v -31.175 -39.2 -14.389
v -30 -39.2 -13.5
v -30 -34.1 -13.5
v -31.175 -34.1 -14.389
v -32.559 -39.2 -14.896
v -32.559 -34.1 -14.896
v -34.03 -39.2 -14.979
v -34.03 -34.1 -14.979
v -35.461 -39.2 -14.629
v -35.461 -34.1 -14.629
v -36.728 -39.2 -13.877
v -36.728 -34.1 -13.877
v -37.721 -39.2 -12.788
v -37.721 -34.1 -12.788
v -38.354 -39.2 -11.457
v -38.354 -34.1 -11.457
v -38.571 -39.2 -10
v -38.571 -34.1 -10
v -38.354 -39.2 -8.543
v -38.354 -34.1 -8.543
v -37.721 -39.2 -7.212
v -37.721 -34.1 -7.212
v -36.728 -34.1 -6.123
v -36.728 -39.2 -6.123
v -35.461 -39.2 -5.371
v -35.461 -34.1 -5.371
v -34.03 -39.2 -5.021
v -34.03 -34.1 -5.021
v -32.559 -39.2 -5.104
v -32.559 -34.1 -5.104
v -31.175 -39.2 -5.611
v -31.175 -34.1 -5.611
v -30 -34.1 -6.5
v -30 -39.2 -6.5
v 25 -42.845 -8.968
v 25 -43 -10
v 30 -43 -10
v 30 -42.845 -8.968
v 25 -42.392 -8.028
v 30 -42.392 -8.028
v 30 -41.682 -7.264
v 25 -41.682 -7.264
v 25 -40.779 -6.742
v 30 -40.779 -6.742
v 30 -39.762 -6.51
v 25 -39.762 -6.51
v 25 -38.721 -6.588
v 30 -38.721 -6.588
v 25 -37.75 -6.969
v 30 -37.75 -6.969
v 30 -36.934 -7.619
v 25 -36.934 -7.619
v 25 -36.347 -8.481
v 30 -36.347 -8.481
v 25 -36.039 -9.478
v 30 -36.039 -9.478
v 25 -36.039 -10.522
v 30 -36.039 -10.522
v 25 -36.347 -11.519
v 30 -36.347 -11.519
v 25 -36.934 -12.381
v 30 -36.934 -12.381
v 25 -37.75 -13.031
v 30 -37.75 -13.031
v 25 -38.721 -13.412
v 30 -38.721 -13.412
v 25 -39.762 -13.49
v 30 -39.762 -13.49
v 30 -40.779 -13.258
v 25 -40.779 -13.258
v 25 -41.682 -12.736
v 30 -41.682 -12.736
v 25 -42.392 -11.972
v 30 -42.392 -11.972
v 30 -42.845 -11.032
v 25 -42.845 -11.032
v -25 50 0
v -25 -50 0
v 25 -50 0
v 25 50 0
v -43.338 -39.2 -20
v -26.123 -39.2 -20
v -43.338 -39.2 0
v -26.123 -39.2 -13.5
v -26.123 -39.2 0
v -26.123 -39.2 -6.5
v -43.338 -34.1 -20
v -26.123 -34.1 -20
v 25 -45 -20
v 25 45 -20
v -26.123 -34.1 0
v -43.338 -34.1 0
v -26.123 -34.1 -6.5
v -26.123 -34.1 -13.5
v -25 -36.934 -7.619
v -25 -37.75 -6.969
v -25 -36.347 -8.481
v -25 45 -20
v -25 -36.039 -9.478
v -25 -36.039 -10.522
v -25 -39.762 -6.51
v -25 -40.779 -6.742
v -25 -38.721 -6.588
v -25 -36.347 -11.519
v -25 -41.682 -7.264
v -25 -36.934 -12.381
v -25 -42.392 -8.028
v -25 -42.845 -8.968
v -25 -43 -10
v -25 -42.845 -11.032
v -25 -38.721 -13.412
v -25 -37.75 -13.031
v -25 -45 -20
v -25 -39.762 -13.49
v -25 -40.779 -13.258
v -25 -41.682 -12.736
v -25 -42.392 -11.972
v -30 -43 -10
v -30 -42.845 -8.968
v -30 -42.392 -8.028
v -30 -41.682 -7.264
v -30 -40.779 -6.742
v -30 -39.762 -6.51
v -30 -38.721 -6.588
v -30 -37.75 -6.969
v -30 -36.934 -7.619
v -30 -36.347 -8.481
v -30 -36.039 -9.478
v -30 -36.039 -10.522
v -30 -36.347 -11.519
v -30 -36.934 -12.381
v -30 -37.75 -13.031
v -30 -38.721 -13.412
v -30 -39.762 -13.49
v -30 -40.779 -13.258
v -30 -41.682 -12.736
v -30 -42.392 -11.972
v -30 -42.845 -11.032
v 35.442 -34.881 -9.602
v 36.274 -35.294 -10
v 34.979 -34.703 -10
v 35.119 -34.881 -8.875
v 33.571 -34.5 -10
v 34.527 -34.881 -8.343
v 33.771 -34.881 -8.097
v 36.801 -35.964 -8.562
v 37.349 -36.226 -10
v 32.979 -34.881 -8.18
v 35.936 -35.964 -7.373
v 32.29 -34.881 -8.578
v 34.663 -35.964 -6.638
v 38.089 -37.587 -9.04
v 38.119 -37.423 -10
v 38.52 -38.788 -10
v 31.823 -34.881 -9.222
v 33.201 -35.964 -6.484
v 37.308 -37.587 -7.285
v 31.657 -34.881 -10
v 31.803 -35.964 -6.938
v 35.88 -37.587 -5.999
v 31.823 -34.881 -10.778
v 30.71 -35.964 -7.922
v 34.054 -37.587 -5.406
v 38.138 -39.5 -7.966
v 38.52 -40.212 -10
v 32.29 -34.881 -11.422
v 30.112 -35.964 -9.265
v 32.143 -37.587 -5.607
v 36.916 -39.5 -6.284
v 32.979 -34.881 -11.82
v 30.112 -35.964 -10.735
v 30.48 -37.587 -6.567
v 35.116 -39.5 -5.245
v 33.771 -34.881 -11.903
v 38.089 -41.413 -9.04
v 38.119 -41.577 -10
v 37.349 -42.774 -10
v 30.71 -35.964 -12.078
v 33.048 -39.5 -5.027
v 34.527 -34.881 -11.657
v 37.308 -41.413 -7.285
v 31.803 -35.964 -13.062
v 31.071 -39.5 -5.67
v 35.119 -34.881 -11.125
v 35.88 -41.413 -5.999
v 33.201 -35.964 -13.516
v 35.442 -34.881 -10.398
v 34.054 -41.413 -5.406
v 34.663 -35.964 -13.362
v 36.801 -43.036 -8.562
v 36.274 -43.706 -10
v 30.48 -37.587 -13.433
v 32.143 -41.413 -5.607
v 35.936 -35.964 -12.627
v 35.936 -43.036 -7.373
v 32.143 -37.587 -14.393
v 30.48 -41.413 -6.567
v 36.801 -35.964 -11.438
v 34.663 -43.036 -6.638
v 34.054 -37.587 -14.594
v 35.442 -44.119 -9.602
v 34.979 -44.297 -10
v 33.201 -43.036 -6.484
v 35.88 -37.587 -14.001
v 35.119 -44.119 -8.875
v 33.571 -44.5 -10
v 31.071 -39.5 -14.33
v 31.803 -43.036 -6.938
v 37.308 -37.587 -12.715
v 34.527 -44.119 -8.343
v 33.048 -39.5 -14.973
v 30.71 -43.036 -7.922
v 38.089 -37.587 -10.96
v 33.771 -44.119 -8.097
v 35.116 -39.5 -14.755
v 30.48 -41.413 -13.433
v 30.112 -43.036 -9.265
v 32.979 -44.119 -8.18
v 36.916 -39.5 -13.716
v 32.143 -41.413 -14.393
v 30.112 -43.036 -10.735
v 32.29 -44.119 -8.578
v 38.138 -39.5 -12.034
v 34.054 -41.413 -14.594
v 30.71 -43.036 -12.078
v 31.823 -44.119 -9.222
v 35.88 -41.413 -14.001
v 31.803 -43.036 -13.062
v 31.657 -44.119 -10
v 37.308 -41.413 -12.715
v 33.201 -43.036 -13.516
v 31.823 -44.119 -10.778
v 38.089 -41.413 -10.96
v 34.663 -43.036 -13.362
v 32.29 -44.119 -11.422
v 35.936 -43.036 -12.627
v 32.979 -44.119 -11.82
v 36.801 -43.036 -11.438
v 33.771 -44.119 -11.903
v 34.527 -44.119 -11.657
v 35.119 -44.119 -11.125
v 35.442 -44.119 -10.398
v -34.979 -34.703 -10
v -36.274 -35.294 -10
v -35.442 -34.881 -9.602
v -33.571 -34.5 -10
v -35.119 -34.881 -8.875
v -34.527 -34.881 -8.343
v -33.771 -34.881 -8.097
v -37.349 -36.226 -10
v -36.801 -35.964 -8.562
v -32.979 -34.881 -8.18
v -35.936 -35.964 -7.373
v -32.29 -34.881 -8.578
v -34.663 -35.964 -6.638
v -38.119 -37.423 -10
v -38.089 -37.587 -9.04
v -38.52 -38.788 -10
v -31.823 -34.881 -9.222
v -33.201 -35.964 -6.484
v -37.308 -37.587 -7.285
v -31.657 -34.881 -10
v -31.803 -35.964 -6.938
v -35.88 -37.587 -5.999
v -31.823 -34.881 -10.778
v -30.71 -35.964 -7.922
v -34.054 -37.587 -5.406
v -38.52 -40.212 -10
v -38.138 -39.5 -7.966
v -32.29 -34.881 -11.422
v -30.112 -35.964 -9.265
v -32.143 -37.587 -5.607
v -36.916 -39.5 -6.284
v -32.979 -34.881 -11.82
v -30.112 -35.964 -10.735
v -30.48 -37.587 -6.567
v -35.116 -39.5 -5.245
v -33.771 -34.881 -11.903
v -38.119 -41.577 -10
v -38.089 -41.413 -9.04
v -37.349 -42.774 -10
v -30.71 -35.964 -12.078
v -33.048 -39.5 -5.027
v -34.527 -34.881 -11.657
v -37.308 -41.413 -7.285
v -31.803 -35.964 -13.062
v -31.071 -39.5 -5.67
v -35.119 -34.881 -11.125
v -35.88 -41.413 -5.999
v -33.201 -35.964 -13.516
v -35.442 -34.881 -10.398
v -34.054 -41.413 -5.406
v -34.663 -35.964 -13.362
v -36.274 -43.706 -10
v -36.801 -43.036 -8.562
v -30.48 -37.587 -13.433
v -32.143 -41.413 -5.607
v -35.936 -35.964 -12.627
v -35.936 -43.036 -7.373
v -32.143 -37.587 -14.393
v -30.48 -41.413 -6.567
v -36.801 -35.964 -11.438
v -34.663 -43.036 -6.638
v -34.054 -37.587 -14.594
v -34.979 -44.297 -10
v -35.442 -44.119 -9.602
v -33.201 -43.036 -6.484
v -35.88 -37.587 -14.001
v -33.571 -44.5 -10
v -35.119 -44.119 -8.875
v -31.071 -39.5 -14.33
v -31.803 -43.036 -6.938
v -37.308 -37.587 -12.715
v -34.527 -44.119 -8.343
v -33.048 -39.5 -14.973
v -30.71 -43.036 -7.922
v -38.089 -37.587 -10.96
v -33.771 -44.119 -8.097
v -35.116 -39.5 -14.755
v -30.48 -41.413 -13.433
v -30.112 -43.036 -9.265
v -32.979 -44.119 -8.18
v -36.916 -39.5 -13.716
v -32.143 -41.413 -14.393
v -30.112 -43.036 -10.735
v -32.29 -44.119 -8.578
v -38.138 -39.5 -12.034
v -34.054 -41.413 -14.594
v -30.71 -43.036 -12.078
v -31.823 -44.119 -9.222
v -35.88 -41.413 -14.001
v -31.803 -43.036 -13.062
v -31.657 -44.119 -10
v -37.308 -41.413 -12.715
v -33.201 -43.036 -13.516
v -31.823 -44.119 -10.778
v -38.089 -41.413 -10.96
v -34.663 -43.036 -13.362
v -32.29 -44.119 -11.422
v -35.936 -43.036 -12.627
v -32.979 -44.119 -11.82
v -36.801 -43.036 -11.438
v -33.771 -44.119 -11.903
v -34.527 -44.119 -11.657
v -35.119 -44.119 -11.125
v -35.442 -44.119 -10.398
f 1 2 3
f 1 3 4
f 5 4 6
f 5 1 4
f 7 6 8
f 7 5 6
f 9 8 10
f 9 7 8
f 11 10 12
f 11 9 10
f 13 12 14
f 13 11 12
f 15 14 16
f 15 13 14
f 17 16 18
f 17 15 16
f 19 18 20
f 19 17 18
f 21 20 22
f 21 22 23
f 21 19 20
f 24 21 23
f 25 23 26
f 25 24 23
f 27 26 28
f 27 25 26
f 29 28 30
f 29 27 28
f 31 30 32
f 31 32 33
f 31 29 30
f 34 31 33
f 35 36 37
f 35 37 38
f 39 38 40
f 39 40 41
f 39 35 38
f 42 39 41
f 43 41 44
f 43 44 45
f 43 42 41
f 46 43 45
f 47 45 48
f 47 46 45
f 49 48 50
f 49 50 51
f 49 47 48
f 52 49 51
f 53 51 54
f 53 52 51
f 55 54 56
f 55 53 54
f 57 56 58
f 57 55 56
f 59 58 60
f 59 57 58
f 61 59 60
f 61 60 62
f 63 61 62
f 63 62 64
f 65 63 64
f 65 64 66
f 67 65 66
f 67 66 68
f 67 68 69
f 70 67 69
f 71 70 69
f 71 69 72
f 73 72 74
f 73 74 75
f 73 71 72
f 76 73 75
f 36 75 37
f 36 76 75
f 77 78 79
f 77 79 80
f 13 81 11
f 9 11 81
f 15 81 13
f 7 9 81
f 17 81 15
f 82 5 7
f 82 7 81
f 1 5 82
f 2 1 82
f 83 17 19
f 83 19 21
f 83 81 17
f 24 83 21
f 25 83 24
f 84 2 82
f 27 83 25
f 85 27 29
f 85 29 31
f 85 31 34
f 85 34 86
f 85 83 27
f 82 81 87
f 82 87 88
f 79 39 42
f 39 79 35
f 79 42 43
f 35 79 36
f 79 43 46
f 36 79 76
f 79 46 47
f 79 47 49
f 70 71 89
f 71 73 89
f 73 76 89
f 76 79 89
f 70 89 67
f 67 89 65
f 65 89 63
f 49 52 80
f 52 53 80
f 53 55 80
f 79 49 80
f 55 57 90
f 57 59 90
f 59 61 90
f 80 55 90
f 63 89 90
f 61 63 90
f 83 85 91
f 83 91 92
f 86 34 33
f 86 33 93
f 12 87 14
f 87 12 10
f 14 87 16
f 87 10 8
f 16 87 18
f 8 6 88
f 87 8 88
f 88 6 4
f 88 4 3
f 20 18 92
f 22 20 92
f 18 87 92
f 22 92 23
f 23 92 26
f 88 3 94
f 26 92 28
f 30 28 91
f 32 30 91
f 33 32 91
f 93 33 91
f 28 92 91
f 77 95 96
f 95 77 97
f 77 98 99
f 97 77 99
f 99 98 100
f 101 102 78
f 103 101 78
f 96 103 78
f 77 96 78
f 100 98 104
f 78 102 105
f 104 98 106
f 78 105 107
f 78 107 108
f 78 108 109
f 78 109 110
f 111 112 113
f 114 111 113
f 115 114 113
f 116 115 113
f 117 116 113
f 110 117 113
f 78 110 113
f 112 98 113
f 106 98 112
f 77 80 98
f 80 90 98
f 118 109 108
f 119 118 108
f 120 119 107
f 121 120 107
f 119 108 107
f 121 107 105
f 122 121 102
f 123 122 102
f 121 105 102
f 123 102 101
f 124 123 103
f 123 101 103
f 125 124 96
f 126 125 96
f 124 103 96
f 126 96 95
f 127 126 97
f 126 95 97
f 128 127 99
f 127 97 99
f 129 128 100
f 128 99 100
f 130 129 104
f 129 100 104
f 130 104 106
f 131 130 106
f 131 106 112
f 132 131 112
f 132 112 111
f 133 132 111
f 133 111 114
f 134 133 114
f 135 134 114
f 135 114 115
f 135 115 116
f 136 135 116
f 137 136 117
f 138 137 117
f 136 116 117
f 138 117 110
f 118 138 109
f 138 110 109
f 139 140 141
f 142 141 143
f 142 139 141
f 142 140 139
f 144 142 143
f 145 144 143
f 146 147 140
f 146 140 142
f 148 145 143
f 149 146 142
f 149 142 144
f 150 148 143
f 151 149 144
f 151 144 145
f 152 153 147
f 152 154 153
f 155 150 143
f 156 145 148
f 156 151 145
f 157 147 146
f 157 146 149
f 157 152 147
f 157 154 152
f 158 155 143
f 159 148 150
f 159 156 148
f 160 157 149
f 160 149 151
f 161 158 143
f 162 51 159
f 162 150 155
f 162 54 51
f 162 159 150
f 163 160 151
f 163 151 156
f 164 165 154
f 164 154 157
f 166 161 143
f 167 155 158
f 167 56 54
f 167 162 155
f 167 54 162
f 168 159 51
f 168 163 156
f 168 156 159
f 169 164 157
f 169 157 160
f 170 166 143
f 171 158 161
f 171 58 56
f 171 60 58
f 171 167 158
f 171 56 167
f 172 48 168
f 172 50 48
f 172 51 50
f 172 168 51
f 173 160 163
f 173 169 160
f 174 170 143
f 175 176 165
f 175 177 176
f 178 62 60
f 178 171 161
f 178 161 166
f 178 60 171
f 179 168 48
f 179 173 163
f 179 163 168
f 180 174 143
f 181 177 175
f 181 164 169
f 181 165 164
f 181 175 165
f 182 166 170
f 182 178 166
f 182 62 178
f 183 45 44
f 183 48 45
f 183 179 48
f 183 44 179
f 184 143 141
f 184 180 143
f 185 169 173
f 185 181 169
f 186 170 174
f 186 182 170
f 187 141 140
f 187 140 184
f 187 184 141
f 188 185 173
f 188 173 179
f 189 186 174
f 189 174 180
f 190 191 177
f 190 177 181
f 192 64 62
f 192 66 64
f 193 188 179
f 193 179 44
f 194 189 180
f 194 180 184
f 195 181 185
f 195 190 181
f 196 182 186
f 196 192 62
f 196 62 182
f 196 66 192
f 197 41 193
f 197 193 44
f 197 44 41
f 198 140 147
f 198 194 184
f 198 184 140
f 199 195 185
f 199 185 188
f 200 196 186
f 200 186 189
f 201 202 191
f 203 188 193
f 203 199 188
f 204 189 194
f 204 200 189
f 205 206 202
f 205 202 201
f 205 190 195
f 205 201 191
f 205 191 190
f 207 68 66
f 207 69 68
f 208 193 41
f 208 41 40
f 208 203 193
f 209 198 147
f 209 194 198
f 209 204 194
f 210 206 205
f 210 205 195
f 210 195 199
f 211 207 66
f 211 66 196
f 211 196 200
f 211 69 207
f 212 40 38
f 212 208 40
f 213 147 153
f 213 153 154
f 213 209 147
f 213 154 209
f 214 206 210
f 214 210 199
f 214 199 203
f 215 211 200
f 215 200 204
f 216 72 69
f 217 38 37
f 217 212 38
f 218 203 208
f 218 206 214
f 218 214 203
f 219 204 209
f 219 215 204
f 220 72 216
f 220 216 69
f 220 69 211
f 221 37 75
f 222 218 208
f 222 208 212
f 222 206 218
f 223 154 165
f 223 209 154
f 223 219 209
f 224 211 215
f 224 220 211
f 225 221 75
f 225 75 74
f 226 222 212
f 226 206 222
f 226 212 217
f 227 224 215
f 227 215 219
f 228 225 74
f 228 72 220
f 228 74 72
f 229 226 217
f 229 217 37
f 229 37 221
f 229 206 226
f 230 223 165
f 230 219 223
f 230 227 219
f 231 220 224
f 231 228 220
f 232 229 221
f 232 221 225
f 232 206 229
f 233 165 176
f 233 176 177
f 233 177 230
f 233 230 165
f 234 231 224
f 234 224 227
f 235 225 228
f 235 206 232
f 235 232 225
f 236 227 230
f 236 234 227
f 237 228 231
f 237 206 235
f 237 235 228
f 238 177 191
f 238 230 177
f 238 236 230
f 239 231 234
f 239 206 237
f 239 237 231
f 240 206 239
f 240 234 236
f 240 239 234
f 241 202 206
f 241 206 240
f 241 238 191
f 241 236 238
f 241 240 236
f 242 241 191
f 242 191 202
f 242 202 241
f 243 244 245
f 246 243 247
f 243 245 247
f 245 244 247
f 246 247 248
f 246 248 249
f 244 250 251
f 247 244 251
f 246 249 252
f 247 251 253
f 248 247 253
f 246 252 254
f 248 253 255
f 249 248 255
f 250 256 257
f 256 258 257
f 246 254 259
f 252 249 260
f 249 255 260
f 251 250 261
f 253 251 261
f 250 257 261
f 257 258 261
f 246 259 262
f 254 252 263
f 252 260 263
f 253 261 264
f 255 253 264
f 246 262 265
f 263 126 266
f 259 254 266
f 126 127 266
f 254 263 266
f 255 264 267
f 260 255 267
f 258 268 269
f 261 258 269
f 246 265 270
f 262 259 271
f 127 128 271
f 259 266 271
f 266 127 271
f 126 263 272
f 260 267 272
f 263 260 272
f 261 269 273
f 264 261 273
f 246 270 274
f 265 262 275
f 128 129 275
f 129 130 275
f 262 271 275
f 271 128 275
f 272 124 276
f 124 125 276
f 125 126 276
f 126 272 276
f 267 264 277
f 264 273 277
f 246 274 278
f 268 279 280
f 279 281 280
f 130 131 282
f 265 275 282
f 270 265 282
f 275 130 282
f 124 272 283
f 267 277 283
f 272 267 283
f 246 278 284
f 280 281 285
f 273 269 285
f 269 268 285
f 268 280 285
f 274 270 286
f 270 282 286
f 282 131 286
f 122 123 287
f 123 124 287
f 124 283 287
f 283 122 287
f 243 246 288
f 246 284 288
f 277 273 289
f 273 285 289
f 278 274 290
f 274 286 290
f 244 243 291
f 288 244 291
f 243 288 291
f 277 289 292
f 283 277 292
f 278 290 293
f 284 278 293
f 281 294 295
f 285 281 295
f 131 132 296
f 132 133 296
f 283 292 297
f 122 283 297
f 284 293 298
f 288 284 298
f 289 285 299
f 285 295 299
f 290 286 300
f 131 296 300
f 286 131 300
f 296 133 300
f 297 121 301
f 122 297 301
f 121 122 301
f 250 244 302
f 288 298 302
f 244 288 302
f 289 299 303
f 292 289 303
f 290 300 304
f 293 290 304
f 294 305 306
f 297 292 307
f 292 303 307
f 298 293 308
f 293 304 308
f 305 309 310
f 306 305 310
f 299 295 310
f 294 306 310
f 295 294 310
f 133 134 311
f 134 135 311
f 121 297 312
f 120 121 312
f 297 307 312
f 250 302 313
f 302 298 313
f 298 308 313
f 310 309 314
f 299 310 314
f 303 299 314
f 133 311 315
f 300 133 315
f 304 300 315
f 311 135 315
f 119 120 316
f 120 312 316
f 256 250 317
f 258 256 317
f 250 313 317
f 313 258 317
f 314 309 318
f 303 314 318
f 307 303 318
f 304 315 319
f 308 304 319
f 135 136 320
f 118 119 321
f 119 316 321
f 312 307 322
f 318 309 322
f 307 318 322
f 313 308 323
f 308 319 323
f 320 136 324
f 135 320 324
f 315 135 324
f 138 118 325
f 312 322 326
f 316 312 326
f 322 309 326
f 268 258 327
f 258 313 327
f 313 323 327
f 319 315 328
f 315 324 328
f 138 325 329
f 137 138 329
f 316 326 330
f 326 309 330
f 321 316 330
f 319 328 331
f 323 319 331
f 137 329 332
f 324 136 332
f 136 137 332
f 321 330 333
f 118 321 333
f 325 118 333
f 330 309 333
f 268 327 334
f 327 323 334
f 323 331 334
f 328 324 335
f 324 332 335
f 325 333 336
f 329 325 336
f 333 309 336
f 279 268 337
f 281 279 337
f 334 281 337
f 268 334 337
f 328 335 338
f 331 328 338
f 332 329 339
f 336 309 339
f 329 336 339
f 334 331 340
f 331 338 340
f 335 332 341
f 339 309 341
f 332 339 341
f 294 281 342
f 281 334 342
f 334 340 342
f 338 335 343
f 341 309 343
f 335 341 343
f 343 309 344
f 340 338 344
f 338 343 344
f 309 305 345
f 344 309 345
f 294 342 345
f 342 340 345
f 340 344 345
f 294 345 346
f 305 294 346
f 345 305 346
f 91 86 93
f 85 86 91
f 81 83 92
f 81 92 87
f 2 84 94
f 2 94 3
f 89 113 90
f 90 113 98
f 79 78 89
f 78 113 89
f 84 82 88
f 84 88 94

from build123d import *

# Parameters (mm, degrees)
F0_W      = 50
F0_H      = 100
F2_W      = 50
F2_H      = 90
F4_R      = 3.5
F5_DEPTH  = 5
F12_DEPTH = 5.1


with BuildPart() as f3:
    # F0 (on Top) → F3 section 0
    with BuildSketch(Plane.XY):
        Rectangle(F0_W, F0_H)
    # F2 (on offset) → F3 section 1
    with BuildSketch(Plane.XY.offset(-20)):
        Rectangle(F2_W, F2_H)
    loft()

    # F4 (on face) → F5 (join)
    with BuildSketch(Plane(origin=(-25, 0, 0), x_dir=(0, -1, 0), z_dir=(-1, 0, 0))):
        with Locations((39.5, -10)):
            Circle(F4_R)
    extrude(amount=F5_DEPTH)

    # F7 (on line) → F8 (revolve)
    with BuildSketch(Plane.XY.offset(-10)):
        with BuildLine():
            Line((-33.5707142143, -44.5), (-33.5707142143, -34.5))
            ThreePointArc((-33.5707142143, -34.5), (-38.5707142143, -39.5), (-33.5707142143, -44.5))
        make_face()
    revolve(axis=Axis((-33.5707142143, -39.5, -10), (0, 1, 0)))

    # F9: F3 across plane


with BuildPart() as f3_1:
    add(f3.part)
    add(f3.part.mirror(Plane.YZ))


with BuildPart() as f12:
    # F11 (on offset) → F12 (new body)
    with BuildSketch(Plane.XZ.offset(39.2)):
        with BuildLine():
            ThreePointArc((-30, -13.5), (-38.5707142143, -10), (-30, -6.5))
            Line((-30, -6.5), (-26.1227637529, -6.5))
            Line((-26.1227637529, -6.5), (-26.1227637529, 0))
            Line((-26.1227637529, 0), (-43.3382727206, 0))
            Line((-43.3382727206, 0), (-43.3382727206, -20))
            Line((-43.3382727206, -20), (-26.1227637529, -20))
            Line((-26.1227637529, -20), (-26.1227637529, -13.5))
            Line((-26.1227637529, -13.5), (-30, -13.5))
        make_face()
    extrude(amount=-F12_DEPTH)


solid = Compound([f3_1.part, f12.part])
